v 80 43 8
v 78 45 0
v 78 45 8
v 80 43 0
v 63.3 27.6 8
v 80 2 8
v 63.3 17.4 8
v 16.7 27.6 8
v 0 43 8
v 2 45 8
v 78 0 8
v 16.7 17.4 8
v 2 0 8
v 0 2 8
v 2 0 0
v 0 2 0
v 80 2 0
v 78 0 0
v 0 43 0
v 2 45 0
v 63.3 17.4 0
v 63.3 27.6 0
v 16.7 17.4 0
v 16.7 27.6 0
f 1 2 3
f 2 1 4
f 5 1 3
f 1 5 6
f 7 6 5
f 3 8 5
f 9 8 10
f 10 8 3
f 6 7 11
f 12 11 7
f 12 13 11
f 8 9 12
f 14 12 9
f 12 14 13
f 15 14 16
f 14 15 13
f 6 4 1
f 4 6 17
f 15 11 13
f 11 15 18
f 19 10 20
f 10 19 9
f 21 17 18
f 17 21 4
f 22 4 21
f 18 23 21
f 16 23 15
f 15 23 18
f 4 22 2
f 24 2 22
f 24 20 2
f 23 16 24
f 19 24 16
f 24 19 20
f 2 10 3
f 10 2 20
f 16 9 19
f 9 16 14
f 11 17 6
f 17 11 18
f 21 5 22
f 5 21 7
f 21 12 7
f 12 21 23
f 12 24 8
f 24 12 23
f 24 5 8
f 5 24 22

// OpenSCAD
$fn = 32;

// ----------------------------------------------------------------------
// Windowed plate: 1 voids, 80 x 45 x 8 mm
// ----------------------------------------------------------------------

// --- parameters (mm) ---
plate_l = 80;             // plate length, X
plate_w = 45;             // plate width, Y
plate_t = 8;              // plate thickness, Z
edge_margin = 12;         // wall from the plate edge to any window
win1_l = 46.6;            // window length
win1_w = 10.2;            // window width
depth_1 = 8;              // depth of void 1 (full thickness = through)
corner_c = 2;             // corner chamfer of the plate

profile = [[2, 0], [78, 0], [80, 2], [80, 43], [78, 45], [2, 45], [0, 43], [0, 2]];  // primary outline, 8 points, counter clockwise
void_1 = [[16.7, 17.4], [63.3, 17.4], [63.3, 27.6], [16.7, 27.6]];  // large central window, 4 points

// --- the one profile operation ---
difference() {
  linear_extrude(height = plate_t) polygon(points = profile);
  translate([0, 0, -1])
    linear_extrude(height = plate_t + 2) polygon(points = void_1);
}
